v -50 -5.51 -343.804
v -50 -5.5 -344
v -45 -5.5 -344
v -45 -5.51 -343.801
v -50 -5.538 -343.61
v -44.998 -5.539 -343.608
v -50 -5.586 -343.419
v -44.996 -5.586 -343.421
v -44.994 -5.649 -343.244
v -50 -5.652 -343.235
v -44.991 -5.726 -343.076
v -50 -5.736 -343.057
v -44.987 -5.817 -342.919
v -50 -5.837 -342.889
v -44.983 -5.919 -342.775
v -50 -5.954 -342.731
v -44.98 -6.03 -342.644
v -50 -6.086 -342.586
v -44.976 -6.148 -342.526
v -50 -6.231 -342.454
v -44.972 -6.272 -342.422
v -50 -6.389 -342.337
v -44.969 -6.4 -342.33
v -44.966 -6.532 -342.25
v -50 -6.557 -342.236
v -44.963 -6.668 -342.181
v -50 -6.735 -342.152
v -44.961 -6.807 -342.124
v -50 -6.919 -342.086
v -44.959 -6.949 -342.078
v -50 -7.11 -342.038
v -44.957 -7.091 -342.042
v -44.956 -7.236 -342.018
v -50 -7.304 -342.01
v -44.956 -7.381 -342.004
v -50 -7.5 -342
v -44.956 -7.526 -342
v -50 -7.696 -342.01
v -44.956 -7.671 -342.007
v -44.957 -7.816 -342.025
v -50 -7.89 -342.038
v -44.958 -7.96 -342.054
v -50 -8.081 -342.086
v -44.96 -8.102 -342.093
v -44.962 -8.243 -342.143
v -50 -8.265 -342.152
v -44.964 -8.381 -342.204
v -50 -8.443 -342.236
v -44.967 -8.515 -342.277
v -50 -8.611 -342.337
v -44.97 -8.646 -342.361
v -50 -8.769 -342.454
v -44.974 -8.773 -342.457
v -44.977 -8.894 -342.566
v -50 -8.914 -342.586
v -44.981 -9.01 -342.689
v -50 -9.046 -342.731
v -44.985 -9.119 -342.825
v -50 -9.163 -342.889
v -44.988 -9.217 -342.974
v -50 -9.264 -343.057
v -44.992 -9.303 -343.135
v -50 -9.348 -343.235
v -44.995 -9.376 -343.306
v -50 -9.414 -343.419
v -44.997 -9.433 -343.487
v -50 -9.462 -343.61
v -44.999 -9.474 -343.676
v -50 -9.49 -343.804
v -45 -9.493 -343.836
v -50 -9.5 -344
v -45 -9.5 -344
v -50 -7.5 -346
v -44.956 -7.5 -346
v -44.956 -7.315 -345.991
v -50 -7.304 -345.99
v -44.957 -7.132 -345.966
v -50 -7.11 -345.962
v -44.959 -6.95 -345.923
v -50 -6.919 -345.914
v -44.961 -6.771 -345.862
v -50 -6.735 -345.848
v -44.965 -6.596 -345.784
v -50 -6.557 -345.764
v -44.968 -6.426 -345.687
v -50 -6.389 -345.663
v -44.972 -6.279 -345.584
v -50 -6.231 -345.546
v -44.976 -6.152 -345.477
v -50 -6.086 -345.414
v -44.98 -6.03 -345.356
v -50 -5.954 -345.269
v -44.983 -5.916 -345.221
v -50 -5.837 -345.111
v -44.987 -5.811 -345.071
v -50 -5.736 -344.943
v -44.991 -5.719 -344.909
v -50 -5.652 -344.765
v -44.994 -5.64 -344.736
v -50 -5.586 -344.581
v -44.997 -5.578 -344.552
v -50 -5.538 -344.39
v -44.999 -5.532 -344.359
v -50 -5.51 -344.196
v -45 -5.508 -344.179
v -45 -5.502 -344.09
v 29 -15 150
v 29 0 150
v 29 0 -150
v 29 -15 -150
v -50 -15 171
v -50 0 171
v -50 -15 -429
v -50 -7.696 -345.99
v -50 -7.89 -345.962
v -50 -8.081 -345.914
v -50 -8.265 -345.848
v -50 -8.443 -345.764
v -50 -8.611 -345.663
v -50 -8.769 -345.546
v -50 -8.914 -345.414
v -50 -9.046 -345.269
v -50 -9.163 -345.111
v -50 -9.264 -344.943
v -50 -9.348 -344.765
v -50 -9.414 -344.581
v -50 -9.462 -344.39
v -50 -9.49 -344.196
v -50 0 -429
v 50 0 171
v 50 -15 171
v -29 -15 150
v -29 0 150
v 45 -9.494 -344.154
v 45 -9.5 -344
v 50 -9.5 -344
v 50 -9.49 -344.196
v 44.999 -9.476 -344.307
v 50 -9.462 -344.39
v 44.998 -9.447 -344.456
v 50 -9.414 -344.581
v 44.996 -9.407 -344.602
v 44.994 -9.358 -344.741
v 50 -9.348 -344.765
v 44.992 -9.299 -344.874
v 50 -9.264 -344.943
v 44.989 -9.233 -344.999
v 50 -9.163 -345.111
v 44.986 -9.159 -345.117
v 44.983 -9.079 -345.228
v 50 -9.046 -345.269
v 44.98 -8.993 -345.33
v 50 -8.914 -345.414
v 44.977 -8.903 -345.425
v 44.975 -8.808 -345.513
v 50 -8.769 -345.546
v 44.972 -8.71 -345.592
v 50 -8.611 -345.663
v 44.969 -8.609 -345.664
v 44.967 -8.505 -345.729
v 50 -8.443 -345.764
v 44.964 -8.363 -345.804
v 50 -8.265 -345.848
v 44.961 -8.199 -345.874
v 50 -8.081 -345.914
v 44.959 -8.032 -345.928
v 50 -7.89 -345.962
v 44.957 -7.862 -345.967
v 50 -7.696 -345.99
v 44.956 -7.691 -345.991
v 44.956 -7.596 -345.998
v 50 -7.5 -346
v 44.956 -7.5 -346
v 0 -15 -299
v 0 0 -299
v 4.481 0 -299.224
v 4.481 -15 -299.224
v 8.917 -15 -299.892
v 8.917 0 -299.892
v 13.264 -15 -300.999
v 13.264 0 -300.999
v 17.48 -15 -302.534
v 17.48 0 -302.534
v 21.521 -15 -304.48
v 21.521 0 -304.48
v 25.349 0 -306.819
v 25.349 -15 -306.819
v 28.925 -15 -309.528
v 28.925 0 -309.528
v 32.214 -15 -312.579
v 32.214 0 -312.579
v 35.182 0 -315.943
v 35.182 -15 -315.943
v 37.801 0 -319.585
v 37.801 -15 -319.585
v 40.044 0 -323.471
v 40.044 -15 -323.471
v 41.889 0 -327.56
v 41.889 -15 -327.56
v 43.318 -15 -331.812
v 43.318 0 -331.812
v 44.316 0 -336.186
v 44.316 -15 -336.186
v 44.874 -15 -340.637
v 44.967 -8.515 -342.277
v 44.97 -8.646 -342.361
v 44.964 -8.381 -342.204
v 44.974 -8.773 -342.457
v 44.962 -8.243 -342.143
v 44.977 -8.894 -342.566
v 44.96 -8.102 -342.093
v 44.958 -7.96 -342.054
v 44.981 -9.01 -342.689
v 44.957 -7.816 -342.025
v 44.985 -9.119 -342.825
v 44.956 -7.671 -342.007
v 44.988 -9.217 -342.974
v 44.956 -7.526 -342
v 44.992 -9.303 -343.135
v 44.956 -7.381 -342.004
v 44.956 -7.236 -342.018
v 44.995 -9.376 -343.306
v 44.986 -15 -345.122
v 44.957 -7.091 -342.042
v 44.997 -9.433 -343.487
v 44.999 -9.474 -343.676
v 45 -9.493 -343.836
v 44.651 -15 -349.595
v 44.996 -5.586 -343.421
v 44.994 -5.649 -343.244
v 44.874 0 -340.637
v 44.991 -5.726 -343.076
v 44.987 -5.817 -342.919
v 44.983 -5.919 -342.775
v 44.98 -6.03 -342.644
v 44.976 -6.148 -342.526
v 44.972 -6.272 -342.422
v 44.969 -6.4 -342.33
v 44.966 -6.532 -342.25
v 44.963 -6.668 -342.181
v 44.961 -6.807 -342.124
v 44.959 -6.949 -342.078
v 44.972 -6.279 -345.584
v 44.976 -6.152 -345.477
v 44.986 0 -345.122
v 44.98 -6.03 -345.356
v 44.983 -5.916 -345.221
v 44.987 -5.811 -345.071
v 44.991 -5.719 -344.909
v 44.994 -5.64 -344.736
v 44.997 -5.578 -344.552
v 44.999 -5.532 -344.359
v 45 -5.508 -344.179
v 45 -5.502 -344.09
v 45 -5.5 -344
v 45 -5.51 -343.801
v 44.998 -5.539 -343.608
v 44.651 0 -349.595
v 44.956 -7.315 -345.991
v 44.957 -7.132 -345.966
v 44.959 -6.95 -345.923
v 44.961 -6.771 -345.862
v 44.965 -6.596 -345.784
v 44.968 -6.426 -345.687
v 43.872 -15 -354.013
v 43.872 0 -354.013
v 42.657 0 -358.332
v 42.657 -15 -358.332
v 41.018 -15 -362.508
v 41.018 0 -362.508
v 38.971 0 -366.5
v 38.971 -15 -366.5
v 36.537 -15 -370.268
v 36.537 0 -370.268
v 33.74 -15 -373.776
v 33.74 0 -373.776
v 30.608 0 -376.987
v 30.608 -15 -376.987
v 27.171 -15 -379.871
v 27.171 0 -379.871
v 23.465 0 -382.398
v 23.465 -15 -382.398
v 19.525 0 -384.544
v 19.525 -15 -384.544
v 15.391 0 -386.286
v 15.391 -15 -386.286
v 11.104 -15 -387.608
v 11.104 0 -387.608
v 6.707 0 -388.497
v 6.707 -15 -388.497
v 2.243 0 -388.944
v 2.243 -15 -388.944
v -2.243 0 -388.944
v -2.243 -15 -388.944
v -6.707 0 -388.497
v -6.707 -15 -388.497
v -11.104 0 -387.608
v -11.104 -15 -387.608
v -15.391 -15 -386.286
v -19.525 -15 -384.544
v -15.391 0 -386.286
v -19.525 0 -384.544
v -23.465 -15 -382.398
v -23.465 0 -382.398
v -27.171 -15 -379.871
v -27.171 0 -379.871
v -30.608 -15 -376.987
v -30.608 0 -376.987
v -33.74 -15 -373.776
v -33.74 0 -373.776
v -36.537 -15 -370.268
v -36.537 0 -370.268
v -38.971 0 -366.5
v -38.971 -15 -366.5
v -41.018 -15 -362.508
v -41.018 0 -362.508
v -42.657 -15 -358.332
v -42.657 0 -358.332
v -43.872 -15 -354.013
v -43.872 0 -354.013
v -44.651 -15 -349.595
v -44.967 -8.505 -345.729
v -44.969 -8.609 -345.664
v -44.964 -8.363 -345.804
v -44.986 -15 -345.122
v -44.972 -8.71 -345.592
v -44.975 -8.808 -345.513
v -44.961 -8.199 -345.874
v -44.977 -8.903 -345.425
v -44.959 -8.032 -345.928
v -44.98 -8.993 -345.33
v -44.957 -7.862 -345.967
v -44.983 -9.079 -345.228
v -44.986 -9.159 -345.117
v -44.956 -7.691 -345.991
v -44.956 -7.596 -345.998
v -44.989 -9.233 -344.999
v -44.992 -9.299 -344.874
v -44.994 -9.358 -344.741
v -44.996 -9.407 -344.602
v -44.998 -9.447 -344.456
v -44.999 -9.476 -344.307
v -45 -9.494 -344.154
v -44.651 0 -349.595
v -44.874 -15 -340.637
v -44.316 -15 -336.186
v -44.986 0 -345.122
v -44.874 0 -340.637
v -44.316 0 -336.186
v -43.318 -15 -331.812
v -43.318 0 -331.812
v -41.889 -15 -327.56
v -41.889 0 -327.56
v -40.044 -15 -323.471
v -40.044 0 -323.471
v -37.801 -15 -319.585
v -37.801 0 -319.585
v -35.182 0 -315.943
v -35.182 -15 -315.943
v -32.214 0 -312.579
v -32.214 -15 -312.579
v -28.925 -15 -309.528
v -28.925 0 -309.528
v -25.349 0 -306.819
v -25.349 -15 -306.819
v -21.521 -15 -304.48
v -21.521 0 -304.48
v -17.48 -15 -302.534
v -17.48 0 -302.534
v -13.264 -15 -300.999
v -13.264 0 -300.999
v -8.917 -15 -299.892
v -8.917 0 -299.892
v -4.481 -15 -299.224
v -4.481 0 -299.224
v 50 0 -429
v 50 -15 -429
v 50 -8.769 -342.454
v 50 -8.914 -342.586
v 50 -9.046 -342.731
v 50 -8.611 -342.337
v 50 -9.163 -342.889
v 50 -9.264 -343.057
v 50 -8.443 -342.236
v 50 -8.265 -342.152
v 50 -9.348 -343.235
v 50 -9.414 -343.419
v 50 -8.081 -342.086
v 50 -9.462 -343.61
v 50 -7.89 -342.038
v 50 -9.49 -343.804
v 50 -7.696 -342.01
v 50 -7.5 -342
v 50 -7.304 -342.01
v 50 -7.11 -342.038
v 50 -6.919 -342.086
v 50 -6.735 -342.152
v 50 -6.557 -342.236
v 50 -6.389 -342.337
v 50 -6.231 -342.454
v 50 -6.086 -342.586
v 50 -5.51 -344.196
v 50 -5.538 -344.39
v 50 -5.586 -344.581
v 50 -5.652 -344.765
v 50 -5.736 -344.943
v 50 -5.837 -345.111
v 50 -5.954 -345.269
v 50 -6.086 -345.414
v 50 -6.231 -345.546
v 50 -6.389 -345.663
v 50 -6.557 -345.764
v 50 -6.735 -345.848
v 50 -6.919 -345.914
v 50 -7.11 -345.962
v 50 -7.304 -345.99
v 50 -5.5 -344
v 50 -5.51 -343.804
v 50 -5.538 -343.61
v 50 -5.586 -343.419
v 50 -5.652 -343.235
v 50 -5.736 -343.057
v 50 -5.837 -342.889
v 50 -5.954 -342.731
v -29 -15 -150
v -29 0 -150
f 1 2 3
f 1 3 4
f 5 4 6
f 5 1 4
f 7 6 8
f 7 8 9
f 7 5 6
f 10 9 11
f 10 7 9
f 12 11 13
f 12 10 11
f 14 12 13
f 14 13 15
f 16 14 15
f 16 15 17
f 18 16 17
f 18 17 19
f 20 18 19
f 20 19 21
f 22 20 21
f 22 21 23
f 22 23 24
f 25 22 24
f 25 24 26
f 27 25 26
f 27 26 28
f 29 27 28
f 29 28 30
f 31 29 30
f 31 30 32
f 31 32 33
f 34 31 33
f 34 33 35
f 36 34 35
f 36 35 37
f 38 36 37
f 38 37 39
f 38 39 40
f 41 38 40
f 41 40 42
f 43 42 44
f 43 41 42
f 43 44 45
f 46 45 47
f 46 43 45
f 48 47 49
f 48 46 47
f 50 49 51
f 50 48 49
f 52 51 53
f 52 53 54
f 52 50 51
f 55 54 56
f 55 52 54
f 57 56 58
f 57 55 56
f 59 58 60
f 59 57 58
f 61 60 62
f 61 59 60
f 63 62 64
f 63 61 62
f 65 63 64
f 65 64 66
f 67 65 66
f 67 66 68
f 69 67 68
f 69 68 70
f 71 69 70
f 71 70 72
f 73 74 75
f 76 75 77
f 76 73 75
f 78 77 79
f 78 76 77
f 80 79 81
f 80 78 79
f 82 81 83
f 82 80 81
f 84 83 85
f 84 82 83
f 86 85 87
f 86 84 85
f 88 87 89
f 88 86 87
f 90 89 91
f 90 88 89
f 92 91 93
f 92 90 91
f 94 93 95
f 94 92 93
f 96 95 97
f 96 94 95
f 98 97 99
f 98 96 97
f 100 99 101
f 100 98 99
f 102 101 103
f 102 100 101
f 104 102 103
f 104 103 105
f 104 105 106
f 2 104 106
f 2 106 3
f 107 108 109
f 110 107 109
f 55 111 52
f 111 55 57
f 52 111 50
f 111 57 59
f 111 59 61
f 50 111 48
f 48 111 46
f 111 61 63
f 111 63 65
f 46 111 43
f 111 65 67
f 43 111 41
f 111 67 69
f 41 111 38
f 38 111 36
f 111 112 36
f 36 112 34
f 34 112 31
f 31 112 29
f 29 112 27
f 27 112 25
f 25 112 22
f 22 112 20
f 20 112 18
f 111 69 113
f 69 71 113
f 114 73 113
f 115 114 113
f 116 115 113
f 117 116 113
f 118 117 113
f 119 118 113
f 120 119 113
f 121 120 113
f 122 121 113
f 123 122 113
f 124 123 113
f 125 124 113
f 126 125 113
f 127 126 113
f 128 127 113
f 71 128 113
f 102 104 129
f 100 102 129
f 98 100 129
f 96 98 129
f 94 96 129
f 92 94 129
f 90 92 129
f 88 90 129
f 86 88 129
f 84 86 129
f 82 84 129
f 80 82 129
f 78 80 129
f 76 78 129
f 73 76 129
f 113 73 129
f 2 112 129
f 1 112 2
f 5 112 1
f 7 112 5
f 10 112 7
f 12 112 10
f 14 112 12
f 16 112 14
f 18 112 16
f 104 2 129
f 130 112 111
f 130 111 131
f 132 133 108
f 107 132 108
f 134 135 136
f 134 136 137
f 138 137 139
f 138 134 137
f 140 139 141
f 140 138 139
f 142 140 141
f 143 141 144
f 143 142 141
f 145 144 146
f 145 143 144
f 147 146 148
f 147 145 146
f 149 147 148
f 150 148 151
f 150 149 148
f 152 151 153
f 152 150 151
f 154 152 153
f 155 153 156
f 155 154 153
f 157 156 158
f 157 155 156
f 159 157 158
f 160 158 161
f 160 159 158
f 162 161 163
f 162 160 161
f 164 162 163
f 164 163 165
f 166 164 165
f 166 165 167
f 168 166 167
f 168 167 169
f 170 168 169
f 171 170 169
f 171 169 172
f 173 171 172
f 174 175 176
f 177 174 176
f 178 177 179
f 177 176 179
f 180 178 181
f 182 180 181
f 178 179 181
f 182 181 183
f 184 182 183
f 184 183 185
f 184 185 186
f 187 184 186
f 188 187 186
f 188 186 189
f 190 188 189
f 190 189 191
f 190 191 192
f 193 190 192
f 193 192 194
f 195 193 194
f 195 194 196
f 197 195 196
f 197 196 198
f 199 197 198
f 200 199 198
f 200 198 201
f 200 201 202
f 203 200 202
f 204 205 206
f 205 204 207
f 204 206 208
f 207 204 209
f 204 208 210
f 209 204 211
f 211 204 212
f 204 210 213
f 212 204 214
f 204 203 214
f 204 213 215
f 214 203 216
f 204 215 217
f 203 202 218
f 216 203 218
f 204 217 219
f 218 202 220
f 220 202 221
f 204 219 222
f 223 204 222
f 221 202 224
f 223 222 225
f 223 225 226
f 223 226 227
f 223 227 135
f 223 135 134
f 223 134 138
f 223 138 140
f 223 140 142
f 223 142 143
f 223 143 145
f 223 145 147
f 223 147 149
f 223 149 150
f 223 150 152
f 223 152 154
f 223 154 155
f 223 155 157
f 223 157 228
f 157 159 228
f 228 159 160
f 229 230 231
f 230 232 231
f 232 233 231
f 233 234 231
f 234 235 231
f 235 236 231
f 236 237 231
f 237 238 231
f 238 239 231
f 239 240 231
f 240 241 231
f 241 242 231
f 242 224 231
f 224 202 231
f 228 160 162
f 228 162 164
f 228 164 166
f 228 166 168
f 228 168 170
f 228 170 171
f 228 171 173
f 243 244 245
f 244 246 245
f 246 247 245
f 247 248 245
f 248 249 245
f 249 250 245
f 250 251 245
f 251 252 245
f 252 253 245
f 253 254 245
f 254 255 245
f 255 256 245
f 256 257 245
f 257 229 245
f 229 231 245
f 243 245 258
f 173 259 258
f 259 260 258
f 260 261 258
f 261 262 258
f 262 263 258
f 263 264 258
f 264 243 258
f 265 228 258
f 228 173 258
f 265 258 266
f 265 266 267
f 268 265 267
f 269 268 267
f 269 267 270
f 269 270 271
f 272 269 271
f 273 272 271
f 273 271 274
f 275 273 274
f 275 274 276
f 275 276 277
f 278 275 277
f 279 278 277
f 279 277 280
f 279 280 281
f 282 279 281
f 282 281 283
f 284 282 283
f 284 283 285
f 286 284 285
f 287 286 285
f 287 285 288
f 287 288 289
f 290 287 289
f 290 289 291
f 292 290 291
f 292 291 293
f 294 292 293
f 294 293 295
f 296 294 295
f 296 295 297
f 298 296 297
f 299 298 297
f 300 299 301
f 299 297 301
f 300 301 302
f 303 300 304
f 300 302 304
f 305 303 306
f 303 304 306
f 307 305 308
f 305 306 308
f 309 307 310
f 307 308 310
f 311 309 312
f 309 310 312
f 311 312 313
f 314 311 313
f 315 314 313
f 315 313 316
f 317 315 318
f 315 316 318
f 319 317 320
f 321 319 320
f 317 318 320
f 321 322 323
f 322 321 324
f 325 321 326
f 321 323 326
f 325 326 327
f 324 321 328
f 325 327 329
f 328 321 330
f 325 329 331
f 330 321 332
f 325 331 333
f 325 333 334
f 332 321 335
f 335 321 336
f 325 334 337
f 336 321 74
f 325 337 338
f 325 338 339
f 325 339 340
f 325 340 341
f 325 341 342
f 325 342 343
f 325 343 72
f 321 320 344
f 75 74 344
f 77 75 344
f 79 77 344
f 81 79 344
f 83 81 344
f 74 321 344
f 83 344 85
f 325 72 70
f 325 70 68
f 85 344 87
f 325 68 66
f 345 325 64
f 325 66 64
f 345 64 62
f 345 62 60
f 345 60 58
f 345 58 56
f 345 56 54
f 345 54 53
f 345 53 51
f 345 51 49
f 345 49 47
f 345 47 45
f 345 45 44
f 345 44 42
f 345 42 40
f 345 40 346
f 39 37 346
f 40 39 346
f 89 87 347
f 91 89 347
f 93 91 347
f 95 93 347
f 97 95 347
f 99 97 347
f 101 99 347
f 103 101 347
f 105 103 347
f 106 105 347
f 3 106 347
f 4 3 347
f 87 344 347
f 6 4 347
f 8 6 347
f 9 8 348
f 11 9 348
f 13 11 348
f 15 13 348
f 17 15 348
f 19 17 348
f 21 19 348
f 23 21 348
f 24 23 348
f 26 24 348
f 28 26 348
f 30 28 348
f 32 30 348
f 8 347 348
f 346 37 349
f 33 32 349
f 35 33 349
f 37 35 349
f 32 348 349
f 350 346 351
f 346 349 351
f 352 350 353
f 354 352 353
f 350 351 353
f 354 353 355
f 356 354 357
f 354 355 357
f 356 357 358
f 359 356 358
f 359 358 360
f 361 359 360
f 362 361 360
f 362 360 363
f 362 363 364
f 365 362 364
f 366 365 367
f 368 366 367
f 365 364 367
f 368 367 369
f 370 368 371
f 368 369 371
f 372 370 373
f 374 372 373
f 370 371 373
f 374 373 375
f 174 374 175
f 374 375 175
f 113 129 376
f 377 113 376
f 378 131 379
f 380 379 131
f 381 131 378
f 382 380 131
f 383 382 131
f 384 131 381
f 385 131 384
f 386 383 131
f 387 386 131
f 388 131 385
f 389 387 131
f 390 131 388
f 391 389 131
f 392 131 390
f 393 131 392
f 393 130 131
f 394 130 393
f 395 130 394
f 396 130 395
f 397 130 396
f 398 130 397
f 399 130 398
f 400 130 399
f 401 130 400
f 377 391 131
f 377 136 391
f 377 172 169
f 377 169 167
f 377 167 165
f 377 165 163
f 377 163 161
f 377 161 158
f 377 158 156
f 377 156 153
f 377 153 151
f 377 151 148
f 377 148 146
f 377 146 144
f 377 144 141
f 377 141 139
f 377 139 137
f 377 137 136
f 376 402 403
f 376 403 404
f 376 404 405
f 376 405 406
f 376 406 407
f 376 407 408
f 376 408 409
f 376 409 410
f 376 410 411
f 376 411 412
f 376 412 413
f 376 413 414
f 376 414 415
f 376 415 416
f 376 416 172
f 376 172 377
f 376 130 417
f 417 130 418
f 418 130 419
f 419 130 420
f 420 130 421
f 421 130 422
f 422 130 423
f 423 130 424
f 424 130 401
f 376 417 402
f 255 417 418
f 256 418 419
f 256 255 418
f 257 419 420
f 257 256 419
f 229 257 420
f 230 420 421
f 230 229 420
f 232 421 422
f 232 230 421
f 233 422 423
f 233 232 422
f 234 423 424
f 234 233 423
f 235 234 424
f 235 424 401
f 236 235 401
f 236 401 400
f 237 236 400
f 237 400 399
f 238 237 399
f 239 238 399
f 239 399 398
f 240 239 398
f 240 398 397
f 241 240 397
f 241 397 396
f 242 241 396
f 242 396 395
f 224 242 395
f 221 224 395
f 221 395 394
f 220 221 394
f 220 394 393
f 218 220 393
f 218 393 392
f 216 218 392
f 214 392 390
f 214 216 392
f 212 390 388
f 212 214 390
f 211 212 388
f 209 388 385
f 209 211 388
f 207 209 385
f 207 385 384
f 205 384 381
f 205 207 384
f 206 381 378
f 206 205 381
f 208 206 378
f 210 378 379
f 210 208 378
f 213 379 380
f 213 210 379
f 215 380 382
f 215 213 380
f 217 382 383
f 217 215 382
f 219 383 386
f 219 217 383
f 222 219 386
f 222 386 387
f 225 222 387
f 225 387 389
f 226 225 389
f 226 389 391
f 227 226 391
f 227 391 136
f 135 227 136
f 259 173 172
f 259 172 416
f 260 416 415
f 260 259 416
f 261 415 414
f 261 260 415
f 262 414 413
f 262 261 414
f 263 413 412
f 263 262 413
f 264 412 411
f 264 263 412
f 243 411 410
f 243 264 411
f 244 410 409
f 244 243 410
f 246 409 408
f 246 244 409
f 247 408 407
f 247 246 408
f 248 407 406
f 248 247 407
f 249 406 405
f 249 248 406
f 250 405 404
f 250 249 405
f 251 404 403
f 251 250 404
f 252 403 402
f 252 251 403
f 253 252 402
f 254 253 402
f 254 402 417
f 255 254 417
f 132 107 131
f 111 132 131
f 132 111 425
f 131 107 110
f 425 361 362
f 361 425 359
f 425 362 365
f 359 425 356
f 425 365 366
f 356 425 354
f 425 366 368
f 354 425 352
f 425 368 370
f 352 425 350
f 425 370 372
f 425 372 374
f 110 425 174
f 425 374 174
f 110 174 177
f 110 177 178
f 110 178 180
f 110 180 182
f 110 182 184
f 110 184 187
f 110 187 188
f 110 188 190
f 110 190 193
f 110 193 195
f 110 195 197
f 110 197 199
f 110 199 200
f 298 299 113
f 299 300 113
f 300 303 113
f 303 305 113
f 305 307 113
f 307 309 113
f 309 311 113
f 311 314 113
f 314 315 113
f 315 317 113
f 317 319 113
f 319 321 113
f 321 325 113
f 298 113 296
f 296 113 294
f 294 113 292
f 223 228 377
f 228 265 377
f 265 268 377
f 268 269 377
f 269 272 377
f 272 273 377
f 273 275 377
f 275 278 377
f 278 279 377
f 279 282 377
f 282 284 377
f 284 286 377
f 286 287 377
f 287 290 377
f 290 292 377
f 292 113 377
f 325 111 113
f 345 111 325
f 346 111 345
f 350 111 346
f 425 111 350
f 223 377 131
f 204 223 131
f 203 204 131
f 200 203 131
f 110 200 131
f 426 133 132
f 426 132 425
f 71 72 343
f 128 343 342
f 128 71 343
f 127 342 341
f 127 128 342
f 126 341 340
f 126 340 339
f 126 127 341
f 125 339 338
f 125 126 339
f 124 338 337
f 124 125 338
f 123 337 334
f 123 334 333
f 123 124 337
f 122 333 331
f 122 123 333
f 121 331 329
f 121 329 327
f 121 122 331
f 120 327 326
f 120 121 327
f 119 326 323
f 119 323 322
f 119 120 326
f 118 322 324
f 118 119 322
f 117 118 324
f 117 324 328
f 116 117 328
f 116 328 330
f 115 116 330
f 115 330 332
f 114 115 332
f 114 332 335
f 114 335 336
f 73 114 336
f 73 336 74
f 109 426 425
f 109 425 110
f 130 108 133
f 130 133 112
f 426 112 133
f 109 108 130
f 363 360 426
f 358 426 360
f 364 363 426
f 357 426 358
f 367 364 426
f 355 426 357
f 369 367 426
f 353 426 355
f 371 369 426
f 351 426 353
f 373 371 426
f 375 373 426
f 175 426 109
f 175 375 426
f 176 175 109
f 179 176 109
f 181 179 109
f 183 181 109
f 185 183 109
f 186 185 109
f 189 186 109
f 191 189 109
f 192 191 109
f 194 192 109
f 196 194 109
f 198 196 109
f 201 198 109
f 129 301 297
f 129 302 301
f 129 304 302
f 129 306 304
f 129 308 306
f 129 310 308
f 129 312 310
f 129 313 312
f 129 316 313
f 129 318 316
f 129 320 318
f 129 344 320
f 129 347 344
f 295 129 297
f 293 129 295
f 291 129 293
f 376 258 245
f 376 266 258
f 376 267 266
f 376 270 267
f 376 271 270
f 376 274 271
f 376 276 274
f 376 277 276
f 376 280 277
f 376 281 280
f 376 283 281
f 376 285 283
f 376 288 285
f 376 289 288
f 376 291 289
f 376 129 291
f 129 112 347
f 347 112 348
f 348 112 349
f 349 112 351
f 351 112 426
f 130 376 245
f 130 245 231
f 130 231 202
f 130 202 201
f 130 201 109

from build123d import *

# Parameters (mm, degrees)
SKETCH1_W               = 100
SKETCH1_H               = 600
BOSS_EXTRUDE2_DEPTH     = 15
SKETCH1_7_W             = 58
SKETCH1_7_H             = 300
CUT_EXTRUDE1_DEPTH      = 65
SKETCH1_8_R             = 45
CUT_EXTRUDE2_DEPTH      = 433.1643206
CUT_EXTRUDE4_DEPTH      = 441.195695118
CUT_EXTRUDE4_DEPTH_BACK = 441.195695118


with BuildPart() as part:
    # Sketch1 → Boss-Extrude2 (new body)
    with BuildSketch(Plane(origin=(0, 0, 0), x_dir=(1, 0, 0), z_dir=(0, 1, 0))):
        with Locations((0, 129)):
            Rectangle(SKETCH1_W, SKETCH1_H)
    extrude(amount=-BOSS_EXTRUDE2_DEPTH)

    # Sketch1<7> → Cut-Extrude1 (cut)
    with BuildSketch(Plane(origin=(0, 0, 0), x_dir=(1, 0, 0), z_dir=(0, 1, 0))):
        Rectangle(SKETCH1_7_W, SKETCH1_7_H)
    extrude(amount=-CUT_EXTRUDE1_DEPTH, mode=Mode.SUBTRACT)

    # Sketch1<8> → Cut-Extrude2 (cut, through all)
    with BuildSketch(Plane(origin=(0, 0, 0), x_dir=(1, 0, 0), z_dir=(0, 1, 0))):
        with Locations(Location((0, 344, 0), (0, 0, 270))):
            Circle(SKETCH1_8_R)
    extrude(amount=-CUT_EXTRUDE2_DEPTH, mode=Mode.SUBTRACT)

    # Sketch5 → Cut-Extrude4 (cut, two sides: drawn at the far end of the back side and taken through both)
    with BuildSketch(Plane(origin=(47.5, 0, 0), x_dir=(0, 0, -1), z_dir=(1, 0, 0)).offset(-CUT_EXTRUDE4_DEPTH_BACK)):
        with BuildLine():
            ThreePointArc((346, -7.5), (345.414213562, -6.085786438), (344, -5.5))
            Line((344, -5.5), (344, -9.5))
            ThreePointArc((344, -9.5), (345.414213562, -8.914213562), (346, -7.5))
        make_face()
        with BuildLine():
            Line((344, -9.5), (344, -5.5))
            ThreePointArc((344, -5.5), (342, -7.5), (344, -9.5))
        make_face()
    extrude(amount=CUT_EXTRUDE4_DEPTH + CUT_EXTRUDE4_DEPTH_BACK, mode=Mode.SUBTRACT)


solid = part.part
